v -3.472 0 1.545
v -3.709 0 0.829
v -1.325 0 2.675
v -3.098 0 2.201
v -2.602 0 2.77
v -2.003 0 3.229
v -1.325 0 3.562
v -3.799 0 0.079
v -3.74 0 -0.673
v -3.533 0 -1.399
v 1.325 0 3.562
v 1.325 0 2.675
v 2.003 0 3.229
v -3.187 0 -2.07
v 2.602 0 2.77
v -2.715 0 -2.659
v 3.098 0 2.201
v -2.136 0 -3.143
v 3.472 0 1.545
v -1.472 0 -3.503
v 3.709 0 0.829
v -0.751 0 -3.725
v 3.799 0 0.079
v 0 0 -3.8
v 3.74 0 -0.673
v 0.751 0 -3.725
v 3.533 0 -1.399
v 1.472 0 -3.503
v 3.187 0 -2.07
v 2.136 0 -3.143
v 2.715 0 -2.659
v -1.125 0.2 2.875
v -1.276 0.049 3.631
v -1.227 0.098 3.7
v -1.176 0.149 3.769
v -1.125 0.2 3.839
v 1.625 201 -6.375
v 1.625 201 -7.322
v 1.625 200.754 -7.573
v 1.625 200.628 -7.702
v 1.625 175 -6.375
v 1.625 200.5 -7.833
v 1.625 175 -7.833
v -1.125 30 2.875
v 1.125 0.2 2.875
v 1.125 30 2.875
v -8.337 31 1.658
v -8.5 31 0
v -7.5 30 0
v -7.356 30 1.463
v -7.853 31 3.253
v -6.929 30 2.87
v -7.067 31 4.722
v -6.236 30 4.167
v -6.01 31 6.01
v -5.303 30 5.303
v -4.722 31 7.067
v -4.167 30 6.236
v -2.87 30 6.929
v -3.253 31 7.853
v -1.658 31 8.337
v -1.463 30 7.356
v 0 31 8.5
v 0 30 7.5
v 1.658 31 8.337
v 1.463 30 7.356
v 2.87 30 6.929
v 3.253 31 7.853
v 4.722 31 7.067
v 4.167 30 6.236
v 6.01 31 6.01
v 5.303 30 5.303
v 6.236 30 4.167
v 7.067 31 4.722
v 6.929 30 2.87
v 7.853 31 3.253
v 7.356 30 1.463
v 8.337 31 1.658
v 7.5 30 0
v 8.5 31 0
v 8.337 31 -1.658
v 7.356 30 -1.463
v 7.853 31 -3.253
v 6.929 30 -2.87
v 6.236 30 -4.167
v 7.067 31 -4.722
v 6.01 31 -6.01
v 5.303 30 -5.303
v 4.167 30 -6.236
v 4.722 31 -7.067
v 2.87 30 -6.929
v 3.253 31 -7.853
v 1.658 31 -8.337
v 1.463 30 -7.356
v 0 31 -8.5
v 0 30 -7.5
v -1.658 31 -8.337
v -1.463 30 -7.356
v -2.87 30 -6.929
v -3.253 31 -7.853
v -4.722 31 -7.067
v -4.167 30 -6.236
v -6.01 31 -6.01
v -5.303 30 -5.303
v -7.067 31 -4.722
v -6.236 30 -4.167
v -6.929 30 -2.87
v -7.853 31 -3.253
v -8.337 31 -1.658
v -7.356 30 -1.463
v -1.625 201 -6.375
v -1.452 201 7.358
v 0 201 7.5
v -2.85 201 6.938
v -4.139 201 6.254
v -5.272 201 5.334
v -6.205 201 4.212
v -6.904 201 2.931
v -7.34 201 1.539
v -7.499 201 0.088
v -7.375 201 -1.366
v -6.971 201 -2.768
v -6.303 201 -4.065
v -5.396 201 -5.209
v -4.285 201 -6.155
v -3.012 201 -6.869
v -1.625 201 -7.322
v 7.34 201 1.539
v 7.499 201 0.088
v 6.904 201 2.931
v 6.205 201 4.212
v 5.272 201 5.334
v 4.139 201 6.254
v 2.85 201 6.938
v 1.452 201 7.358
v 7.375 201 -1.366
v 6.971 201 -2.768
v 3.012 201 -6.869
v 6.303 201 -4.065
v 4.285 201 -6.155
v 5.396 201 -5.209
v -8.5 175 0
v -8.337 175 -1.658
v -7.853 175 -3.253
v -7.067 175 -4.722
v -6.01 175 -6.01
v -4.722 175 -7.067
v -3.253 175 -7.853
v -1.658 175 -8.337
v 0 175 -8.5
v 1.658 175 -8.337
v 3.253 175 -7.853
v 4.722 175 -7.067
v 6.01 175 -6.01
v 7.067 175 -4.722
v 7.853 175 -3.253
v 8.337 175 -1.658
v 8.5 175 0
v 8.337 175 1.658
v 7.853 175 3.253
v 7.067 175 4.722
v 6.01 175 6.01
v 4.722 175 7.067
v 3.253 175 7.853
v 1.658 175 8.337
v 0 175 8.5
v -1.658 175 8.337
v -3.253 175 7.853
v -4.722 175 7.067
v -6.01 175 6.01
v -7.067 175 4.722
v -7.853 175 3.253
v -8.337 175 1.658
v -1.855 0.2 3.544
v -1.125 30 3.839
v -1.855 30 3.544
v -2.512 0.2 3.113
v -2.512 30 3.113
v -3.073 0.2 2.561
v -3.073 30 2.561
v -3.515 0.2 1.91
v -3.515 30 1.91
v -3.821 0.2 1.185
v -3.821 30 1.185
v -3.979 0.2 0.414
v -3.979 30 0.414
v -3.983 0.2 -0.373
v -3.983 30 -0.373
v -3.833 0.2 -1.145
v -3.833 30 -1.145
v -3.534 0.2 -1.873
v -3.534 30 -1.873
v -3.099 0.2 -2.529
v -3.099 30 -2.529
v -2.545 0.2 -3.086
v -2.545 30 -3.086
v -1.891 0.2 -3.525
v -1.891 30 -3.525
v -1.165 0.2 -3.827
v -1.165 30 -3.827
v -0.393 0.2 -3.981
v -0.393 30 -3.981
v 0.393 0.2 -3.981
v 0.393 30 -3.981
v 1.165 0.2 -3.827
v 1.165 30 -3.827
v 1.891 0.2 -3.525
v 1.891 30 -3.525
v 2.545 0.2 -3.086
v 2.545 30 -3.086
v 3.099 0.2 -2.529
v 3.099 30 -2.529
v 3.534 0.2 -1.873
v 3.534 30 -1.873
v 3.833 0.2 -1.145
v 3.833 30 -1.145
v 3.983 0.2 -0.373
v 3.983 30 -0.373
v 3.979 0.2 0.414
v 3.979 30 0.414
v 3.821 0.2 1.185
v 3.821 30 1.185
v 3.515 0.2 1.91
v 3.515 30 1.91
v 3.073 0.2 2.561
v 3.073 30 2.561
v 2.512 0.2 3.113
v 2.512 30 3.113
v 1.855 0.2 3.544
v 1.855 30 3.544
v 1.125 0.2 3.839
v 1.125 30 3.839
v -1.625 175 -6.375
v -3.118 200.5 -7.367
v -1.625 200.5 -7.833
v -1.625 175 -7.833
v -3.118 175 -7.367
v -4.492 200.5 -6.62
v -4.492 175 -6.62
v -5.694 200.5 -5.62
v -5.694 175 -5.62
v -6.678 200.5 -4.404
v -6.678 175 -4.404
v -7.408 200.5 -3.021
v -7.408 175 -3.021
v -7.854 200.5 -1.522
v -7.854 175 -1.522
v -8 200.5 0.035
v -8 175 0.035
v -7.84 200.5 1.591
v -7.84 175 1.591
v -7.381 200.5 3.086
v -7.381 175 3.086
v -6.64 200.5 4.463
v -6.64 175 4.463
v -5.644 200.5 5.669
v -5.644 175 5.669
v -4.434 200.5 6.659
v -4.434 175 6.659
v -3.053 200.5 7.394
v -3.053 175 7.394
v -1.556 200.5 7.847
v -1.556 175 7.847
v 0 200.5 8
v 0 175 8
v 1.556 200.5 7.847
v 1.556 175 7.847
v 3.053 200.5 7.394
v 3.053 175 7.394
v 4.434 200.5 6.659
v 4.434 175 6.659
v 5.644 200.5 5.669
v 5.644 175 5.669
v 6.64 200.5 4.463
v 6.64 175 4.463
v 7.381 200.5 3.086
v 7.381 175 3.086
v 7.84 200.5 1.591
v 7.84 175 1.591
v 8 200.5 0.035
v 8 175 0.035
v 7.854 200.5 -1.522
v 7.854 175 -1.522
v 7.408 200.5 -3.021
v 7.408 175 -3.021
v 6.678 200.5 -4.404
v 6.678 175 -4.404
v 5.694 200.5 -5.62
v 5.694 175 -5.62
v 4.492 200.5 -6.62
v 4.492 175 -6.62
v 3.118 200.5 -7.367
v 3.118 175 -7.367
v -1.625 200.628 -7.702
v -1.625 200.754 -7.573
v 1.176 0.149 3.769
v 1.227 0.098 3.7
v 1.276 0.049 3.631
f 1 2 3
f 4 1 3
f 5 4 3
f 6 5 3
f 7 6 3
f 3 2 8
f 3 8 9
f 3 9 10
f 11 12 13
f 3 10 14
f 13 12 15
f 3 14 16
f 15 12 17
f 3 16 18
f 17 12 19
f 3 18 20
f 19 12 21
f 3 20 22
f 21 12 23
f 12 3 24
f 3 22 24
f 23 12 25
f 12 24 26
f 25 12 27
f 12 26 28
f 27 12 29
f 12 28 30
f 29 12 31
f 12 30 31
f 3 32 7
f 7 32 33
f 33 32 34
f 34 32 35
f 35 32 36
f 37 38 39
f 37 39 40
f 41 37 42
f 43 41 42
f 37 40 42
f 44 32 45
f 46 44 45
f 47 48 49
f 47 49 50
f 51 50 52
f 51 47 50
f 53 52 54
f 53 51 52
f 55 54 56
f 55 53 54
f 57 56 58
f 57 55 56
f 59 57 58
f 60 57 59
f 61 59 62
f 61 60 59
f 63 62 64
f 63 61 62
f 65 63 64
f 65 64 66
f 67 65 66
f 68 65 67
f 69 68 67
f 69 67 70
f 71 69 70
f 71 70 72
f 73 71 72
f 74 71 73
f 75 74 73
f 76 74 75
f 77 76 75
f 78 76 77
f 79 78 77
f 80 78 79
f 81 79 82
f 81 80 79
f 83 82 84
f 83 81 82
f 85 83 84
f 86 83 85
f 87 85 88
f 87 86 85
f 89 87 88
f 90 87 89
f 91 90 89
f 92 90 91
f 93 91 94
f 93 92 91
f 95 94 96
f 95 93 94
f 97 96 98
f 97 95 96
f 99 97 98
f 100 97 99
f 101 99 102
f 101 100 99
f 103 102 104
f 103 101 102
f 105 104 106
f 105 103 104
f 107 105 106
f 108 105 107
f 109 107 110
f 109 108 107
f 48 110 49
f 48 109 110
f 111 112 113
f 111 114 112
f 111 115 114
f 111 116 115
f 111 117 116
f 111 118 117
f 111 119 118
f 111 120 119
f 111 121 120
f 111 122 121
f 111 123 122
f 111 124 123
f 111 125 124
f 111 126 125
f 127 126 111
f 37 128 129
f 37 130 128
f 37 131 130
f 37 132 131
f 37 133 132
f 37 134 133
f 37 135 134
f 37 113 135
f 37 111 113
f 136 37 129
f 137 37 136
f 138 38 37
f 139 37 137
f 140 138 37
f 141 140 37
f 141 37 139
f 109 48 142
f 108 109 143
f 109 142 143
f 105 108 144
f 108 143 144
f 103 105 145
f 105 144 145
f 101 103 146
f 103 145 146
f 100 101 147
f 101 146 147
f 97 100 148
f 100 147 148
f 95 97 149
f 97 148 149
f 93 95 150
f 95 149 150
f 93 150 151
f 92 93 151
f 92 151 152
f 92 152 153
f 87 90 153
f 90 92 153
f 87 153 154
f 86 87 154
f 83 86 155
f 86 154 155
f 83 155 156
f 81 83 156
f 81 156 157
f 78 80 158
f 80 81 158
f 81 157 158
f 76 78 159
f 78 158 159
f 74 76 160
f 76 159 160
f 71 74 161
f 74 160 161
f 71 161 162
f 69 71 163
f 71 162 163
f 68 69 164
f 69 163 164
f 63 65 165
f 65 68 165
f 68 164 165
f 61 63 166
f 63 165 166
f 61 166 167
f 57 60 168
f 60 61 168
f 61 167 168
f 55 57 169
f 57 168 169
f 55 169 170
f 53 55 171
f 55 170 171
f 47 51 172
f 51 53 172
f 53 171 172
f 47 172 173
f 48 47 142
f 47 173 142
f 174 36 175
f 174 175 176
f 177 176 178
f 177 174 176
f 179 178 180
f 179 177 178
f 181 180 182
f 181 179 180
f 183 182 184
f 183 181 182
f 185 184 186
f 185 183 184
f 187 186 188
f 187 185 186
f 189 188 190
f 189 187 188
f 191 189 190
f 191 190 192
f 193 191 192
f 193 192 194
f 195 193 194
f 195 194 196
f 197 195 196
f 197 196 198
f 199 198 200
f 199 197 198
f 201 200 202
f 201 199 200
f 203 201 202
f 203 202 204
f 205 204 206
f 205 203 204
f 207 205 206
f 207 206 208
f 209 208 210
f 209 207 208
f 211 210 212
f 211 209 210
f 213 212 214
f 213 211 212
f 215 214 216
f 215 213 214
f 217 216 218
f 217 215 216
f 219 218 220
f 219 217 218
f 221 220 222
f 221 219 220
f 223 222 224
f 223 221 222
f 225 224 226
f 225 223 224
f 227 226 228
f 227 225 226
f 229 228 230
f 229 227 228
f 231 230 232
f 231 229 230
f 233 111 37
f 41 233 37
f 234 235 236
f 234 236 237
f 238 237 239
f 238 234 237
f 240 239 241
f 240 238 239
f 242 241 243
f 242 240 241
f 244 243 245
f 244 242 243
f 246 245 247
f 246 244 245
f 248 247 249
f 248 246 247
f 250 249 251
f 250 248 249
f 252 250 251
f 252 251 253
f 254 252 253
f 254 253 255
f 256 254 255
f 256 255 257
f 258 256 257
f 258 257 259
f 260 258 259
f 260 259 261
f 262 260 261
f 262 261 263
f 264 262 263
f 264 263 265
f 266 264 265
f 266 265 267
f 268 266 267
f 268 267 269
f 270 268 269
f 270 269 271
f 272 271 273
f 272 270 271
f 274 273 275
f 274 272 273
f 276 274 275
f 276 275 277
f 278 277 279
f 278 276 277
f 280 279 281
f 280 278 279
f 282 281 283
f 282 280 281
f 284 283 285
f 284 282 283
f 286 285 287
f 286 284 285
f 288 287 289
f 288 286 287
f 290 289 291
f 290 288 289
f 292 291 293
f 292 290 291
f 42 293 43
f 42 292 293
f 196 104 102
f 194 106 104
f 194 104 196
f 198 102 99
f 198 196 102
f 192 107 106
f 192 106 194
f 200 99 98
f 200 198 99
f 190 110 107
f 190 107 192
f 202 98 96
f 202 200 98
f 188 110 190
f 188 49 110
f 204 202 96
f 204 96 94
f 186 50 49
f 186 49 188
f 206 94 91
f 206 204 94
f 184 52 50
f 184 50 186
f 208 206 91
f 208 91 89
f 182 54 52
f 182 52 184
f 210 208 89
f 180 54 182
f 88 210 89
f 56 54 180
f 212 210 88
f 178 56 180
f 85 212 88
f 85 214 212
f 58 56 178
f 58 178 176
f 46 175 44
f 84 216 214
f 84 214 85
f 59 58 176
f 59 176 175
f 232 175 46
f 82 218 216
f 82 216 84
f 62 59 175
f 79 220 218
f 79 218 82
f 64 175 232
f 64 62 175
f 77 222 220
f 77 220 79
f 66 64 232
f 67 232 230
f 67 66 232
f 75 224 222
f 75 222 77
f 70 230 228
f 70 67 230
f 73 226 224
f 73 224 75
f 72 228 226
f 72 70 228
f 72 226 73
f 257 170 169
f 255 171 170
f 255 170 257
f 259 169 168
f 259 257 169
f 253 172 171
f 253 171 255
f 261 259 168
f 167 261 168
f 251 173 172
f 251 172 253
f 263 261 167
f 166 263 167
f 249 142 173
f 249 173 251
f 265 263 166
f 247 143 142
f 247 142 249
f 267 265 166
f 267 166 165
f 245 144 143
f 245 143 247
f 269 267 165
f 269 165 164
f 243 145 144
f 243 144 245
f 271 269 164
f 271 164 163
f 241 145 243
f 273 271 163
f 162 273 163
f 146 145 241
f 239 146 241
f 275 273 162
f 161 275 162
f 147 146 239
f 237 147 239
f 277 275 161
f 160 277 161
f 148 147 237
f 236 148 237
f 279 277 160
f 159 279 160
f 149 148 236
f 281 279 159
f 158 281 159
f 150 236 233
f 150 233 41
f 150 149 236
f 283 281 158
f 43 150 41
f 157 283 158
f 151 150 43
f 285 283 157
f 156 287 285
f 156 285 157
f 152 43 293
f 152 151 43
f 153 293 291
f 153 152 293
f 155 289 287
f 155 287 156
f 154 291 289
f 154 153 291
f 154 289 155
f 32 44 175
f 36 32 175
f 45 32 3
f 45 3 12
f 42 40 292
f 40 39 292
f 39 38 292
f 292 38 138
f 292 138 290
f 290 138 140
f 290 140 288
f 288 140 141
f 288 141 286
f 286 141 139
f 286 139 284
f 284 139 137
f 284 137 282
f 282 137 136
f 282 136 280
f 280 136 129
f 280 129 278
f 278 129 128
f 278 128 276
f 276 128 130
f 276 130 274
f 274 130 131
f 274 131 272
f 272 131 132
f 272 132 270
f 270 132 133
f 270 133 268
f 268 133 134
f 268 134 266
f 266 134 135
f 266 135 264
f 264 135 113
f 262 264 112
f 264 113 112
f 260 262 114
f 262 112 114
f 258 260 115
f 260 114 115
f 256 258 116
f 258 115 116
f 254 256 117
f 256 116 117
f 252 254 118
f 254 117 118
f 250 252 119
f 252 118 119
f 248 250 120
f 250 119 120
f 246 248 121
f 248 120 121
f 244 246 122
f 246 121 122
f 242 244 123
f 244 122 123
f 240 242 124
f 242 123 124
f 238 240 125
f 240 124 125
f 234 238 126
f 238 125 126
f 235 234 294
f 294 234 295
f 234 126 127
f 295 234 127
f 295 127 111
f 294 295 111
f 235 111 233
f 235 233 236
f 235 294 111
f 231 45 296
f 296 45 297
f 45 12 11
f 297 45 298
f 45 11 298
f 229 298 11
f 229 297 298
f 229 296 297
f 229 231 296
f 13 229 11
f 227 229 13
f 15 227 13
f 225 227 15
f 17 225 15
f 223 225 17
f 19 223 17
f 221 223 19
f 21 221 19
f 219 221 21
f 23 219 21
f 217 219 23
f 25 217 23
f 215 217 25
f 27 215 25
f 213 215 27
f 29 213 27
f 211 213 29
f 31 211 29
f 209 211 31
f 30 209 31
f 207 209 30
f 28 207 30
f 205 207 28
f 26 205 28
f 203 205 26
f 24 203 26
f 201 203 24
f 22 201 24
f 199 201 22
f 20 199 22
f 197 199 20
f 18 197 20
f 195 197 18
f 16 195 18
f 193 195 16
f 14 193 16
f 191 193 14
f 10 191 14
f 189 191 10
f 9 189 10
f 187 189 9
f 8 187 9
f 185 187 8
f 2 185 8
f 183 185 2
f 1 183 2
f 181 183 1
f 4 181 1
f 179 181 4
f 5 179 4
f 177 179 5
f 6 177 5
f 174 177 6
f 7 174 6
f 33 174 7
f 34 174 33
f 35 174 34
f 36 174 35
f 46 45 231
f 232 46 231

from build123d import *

# Parameters (mm, degrees)
SKETCH1_W          = 8.5
SKETCH1_H          = 201
SKETCH2_OUTSIDE_W  = 59.486
SKETCH2_OUTSIDE_H  = 59.486
SKETCH2_OUTSIDE_R  = 8
CUT_EXTRUDE1_DEPTH = 26
SKETCH3_W          = 3.25
SKETCH3_H          = 3.25
CUT_EXTRUDE2_DEPTH = 26
CHAMFER1_SIZE      = 0.5
SKETCH4_OUTSIDE_W  = 59.486
SKETCH4_OUTSIDE_H  = 59.486
SKETCH4_OUTSIDE_R  = 4
CUT_EXTRUDE3_DEPTH = 30
CHAMFER2_SIZE      = 1
SKETCH5_W          = 2.25
SKETCH5_H          = 2.25
CUT_EXTRUDE4_DEPTH = 30
CHAMFER3_SIZE      = 0.2


with BuildPart() as part:
    # Sketch1 → Revolve1 (revolve)
    with BuildSketch(Plane.XY, mode=Mode.PRIVATE) as revolve1_sk:
        with Locations((4.25, 100.5)):
            Rectangle(SKETCH1_W, SKETCH1_H)
    revolve(revolve1_sk.sketch.rotate(Axis((0, 201, 0), (0, -1, 0)), 180), axis=Axis((0, 201, 0), (0, -1, 0)))

    # Sketch2 outside → Cut-Extrude1 (cut)
    with BuildSketch(Plane(origin=(0, 201, 0), x_dir=(1, 0, 0), z_dir=(0, 1, 0))):
        Rectangle(SKETCH2_OUTSIDE_W, SKETCH2_OUTSIDE_H)
        with Locations(Location((0, 0, 0), (0, 0, 180))):
            Circle(SKETCH2_OUTSIDE_R, mode=Mode.SUBTRACT)
    extrude(amount=-CUT_EXTRUDE1_DEPTH, mode=Mode.SUBTRACT)

    # Sketch3 → Cut-Extrude2 (cut)
    with BuildSketch(Plane(origin=(0, 201, 0), x_dir=(1, 0, 0), z_dir=(0, 1, 0))):
        with Locations((0, 8)):
            Rectangle(SKETCH3_W, SKETCH3_H)
    extrude(amount=-CUT_EXTRUDE2_DEPTH, mode=Mode.SUBTRACT)

    # Chamfer1
    chamfer1_edges = [part.edges().sort_by_distance(p)[0] for p in [
        (0, 201, 8),
        (8.5, 0, 0),
    ]]
    chamfer(chamfer1_edges, length=CHAMFER1_SIZE)

    # Sketch4 outside → Cut-Extrude3 (cut)
    with BuildSketch(Plane.XZ):
        Rectangle(SKETCH4_OUTSIDE_W, SKETCH4_OUTSIDE_H)
        Circle(SKETCH4_OUTSIDE_R, mode=Mode.SUBTRACT)
    extrude(amount=-CUT_EXTRUDE3_DEPTH, mode=Mode.SUBTRACT)

    # Chamfer2
    chamfer2_edges = [part.edges().sort_by_distance(p)[0] for p in [
        (8.5, 30, 0),
    ]]
    chamfer(chamfer2_edges, length=CHAMFER2_SIZE)

    # Sketch5 → Cut-Extrude4 (cut)
    with BuildSketch(Plane.XZ):
        with Locations((0, 4)):
            Rectangle(SKETCH5_W, SKETCH5_H)
    extrude(amount=-CUT_EXTRUDE4_DEPTH, mode=Mode.SUBTRACT)

    # Chamfer3
    chamfer3_edges = [part.edges().sort_by_distance(p)[0] for p in [
        (0, 0, -4),
        (-1.125, 0, 3.356769067),
        (0, 0, 2.875),
        (1.125, 0, 3.356769067),
    ]]
    chamfer(chamfer3_edges, length=CHAMFER3_SIZE)


solid = part.part
